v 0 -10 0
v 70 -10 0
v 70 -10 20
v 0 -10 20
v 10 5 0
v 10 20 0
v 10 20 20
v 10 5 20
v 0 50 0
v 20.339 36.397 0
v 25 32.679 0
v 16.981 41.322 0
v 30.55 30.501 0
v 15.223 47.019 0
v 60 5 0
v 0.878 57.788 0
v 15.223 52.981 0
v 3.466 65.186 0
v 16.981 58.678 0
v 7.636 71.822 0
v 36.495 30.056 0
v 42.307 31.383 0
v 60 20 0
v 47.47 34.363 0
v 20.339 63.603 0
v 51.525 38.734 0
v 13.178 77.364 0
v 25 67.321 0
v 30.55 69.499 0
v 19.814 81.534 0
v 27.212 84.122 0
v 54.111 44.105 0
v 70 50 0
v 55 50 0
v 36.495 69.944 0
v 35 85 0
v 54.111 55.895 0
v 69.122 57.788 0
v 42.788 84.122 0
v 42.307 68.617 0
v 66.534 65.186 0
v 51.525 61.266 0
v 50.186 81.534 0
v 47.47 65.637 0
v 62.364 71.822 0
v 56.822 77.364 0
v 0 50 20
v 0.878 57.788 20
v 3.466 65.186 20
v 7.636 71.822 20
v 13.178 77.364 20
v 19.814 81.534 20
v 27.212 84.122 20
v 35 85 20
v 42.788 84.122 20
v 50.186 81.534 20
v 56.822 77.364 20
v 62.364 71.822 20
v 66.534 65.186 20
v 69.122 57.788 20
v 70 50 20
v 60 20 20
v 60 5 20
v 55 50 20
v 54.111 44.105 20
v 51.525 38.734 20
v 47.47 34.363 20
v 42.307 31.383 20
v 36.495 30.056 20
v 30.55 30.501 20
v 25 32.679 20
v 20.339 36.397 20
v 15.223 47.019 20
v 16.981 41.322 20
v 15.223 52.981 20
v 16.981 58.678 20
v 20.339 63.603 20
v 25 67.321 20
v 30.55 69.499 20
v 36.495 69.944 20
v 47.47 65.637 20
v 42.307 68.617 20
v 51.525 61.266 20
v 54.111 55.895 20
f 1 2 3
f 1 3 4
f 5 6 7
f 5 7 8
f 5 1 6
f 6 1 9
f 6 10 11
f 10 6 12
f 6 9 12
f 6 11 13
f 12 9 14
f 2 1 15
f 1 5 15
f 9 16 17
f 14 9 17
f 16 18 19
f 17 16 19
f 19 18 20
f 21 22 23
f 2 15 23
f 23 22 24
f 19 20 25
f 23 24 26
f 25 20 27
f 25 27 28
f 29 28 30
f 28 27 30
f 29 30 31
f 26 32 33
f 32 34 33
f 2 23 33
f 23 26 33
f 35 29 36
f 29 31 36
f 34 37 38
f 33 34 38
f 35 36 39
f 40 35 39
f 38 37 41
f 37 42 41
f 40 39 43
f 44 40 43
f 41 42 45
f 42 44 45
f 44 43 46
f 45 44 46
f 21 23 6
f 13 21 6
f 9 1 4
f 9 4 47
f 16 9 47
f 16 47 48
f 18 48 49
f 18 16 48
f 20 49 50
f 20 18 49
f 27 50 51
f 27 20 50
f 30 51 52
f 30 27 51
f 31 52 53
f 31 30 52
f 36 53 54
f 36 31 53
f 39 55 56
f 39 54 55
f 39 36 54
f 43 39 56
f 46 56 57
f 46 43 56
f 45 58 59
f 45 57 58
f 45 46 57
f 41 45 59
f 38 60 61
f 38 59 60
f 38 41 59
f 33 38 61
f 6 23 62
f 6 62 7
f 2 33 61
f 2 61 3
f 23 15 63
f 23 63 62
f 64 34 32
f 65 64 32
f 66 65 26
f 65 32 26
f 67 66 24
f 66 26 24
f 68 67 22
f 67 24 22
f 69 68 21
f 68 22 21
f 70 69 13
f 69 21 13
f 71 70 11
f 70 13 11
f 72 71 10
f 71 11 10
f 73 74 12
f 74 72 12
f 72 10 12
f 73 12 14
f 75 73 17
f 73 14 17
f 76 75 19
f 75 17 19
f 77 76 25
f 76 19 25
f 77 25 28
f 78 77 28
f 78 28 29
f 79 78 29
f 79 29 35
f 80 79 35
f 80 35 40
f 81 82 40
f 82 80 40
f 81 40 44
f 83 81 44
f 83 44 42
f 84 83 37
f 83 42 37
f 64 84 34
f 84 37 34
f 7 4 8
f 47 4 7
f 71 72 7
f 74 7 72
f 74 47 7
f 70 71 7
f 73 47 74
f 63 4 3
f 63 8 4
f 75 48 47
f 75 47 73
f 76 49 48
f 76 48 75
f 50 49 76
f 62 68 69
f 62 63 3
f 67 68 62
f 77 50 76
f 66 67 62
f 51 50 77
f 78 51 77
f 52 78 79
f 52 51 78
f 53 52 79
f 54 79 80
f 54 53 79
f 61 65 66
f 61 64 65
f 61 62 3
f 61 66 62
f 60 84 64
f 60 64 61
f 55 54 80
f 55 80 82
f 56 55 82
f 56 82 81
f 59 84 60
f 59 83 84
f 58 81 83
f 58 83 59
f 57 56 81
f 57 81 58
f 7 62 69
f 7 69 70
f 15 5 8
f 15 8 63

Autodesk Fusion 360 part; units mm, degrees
sketch "Sketch1" plane through (0, 0, 0) normal (0, 0, 1) x (1, 0, 0)
  line L0 (70, 50) -> (70, -10)
  line L1 (70, -10) -> (0, -10)
  line L2 (0, -10) -> (0, 50)
  circle A0 centre (35, 50) radius 20
  arc A1 (70, 50) -> (0, 50) centre (35, 50) ccw
  line L3 (10, 5) -> (60, 5)
  line L4 (60, 5) -> (60, 20)
  line L5 (60, 20) -> (10, 20)
  line L6 (10, 20) -> (10, 5)
  dimension "d1" = 40
extrude "Extrude1" add sketch "Sketch1" along normal blind 20
